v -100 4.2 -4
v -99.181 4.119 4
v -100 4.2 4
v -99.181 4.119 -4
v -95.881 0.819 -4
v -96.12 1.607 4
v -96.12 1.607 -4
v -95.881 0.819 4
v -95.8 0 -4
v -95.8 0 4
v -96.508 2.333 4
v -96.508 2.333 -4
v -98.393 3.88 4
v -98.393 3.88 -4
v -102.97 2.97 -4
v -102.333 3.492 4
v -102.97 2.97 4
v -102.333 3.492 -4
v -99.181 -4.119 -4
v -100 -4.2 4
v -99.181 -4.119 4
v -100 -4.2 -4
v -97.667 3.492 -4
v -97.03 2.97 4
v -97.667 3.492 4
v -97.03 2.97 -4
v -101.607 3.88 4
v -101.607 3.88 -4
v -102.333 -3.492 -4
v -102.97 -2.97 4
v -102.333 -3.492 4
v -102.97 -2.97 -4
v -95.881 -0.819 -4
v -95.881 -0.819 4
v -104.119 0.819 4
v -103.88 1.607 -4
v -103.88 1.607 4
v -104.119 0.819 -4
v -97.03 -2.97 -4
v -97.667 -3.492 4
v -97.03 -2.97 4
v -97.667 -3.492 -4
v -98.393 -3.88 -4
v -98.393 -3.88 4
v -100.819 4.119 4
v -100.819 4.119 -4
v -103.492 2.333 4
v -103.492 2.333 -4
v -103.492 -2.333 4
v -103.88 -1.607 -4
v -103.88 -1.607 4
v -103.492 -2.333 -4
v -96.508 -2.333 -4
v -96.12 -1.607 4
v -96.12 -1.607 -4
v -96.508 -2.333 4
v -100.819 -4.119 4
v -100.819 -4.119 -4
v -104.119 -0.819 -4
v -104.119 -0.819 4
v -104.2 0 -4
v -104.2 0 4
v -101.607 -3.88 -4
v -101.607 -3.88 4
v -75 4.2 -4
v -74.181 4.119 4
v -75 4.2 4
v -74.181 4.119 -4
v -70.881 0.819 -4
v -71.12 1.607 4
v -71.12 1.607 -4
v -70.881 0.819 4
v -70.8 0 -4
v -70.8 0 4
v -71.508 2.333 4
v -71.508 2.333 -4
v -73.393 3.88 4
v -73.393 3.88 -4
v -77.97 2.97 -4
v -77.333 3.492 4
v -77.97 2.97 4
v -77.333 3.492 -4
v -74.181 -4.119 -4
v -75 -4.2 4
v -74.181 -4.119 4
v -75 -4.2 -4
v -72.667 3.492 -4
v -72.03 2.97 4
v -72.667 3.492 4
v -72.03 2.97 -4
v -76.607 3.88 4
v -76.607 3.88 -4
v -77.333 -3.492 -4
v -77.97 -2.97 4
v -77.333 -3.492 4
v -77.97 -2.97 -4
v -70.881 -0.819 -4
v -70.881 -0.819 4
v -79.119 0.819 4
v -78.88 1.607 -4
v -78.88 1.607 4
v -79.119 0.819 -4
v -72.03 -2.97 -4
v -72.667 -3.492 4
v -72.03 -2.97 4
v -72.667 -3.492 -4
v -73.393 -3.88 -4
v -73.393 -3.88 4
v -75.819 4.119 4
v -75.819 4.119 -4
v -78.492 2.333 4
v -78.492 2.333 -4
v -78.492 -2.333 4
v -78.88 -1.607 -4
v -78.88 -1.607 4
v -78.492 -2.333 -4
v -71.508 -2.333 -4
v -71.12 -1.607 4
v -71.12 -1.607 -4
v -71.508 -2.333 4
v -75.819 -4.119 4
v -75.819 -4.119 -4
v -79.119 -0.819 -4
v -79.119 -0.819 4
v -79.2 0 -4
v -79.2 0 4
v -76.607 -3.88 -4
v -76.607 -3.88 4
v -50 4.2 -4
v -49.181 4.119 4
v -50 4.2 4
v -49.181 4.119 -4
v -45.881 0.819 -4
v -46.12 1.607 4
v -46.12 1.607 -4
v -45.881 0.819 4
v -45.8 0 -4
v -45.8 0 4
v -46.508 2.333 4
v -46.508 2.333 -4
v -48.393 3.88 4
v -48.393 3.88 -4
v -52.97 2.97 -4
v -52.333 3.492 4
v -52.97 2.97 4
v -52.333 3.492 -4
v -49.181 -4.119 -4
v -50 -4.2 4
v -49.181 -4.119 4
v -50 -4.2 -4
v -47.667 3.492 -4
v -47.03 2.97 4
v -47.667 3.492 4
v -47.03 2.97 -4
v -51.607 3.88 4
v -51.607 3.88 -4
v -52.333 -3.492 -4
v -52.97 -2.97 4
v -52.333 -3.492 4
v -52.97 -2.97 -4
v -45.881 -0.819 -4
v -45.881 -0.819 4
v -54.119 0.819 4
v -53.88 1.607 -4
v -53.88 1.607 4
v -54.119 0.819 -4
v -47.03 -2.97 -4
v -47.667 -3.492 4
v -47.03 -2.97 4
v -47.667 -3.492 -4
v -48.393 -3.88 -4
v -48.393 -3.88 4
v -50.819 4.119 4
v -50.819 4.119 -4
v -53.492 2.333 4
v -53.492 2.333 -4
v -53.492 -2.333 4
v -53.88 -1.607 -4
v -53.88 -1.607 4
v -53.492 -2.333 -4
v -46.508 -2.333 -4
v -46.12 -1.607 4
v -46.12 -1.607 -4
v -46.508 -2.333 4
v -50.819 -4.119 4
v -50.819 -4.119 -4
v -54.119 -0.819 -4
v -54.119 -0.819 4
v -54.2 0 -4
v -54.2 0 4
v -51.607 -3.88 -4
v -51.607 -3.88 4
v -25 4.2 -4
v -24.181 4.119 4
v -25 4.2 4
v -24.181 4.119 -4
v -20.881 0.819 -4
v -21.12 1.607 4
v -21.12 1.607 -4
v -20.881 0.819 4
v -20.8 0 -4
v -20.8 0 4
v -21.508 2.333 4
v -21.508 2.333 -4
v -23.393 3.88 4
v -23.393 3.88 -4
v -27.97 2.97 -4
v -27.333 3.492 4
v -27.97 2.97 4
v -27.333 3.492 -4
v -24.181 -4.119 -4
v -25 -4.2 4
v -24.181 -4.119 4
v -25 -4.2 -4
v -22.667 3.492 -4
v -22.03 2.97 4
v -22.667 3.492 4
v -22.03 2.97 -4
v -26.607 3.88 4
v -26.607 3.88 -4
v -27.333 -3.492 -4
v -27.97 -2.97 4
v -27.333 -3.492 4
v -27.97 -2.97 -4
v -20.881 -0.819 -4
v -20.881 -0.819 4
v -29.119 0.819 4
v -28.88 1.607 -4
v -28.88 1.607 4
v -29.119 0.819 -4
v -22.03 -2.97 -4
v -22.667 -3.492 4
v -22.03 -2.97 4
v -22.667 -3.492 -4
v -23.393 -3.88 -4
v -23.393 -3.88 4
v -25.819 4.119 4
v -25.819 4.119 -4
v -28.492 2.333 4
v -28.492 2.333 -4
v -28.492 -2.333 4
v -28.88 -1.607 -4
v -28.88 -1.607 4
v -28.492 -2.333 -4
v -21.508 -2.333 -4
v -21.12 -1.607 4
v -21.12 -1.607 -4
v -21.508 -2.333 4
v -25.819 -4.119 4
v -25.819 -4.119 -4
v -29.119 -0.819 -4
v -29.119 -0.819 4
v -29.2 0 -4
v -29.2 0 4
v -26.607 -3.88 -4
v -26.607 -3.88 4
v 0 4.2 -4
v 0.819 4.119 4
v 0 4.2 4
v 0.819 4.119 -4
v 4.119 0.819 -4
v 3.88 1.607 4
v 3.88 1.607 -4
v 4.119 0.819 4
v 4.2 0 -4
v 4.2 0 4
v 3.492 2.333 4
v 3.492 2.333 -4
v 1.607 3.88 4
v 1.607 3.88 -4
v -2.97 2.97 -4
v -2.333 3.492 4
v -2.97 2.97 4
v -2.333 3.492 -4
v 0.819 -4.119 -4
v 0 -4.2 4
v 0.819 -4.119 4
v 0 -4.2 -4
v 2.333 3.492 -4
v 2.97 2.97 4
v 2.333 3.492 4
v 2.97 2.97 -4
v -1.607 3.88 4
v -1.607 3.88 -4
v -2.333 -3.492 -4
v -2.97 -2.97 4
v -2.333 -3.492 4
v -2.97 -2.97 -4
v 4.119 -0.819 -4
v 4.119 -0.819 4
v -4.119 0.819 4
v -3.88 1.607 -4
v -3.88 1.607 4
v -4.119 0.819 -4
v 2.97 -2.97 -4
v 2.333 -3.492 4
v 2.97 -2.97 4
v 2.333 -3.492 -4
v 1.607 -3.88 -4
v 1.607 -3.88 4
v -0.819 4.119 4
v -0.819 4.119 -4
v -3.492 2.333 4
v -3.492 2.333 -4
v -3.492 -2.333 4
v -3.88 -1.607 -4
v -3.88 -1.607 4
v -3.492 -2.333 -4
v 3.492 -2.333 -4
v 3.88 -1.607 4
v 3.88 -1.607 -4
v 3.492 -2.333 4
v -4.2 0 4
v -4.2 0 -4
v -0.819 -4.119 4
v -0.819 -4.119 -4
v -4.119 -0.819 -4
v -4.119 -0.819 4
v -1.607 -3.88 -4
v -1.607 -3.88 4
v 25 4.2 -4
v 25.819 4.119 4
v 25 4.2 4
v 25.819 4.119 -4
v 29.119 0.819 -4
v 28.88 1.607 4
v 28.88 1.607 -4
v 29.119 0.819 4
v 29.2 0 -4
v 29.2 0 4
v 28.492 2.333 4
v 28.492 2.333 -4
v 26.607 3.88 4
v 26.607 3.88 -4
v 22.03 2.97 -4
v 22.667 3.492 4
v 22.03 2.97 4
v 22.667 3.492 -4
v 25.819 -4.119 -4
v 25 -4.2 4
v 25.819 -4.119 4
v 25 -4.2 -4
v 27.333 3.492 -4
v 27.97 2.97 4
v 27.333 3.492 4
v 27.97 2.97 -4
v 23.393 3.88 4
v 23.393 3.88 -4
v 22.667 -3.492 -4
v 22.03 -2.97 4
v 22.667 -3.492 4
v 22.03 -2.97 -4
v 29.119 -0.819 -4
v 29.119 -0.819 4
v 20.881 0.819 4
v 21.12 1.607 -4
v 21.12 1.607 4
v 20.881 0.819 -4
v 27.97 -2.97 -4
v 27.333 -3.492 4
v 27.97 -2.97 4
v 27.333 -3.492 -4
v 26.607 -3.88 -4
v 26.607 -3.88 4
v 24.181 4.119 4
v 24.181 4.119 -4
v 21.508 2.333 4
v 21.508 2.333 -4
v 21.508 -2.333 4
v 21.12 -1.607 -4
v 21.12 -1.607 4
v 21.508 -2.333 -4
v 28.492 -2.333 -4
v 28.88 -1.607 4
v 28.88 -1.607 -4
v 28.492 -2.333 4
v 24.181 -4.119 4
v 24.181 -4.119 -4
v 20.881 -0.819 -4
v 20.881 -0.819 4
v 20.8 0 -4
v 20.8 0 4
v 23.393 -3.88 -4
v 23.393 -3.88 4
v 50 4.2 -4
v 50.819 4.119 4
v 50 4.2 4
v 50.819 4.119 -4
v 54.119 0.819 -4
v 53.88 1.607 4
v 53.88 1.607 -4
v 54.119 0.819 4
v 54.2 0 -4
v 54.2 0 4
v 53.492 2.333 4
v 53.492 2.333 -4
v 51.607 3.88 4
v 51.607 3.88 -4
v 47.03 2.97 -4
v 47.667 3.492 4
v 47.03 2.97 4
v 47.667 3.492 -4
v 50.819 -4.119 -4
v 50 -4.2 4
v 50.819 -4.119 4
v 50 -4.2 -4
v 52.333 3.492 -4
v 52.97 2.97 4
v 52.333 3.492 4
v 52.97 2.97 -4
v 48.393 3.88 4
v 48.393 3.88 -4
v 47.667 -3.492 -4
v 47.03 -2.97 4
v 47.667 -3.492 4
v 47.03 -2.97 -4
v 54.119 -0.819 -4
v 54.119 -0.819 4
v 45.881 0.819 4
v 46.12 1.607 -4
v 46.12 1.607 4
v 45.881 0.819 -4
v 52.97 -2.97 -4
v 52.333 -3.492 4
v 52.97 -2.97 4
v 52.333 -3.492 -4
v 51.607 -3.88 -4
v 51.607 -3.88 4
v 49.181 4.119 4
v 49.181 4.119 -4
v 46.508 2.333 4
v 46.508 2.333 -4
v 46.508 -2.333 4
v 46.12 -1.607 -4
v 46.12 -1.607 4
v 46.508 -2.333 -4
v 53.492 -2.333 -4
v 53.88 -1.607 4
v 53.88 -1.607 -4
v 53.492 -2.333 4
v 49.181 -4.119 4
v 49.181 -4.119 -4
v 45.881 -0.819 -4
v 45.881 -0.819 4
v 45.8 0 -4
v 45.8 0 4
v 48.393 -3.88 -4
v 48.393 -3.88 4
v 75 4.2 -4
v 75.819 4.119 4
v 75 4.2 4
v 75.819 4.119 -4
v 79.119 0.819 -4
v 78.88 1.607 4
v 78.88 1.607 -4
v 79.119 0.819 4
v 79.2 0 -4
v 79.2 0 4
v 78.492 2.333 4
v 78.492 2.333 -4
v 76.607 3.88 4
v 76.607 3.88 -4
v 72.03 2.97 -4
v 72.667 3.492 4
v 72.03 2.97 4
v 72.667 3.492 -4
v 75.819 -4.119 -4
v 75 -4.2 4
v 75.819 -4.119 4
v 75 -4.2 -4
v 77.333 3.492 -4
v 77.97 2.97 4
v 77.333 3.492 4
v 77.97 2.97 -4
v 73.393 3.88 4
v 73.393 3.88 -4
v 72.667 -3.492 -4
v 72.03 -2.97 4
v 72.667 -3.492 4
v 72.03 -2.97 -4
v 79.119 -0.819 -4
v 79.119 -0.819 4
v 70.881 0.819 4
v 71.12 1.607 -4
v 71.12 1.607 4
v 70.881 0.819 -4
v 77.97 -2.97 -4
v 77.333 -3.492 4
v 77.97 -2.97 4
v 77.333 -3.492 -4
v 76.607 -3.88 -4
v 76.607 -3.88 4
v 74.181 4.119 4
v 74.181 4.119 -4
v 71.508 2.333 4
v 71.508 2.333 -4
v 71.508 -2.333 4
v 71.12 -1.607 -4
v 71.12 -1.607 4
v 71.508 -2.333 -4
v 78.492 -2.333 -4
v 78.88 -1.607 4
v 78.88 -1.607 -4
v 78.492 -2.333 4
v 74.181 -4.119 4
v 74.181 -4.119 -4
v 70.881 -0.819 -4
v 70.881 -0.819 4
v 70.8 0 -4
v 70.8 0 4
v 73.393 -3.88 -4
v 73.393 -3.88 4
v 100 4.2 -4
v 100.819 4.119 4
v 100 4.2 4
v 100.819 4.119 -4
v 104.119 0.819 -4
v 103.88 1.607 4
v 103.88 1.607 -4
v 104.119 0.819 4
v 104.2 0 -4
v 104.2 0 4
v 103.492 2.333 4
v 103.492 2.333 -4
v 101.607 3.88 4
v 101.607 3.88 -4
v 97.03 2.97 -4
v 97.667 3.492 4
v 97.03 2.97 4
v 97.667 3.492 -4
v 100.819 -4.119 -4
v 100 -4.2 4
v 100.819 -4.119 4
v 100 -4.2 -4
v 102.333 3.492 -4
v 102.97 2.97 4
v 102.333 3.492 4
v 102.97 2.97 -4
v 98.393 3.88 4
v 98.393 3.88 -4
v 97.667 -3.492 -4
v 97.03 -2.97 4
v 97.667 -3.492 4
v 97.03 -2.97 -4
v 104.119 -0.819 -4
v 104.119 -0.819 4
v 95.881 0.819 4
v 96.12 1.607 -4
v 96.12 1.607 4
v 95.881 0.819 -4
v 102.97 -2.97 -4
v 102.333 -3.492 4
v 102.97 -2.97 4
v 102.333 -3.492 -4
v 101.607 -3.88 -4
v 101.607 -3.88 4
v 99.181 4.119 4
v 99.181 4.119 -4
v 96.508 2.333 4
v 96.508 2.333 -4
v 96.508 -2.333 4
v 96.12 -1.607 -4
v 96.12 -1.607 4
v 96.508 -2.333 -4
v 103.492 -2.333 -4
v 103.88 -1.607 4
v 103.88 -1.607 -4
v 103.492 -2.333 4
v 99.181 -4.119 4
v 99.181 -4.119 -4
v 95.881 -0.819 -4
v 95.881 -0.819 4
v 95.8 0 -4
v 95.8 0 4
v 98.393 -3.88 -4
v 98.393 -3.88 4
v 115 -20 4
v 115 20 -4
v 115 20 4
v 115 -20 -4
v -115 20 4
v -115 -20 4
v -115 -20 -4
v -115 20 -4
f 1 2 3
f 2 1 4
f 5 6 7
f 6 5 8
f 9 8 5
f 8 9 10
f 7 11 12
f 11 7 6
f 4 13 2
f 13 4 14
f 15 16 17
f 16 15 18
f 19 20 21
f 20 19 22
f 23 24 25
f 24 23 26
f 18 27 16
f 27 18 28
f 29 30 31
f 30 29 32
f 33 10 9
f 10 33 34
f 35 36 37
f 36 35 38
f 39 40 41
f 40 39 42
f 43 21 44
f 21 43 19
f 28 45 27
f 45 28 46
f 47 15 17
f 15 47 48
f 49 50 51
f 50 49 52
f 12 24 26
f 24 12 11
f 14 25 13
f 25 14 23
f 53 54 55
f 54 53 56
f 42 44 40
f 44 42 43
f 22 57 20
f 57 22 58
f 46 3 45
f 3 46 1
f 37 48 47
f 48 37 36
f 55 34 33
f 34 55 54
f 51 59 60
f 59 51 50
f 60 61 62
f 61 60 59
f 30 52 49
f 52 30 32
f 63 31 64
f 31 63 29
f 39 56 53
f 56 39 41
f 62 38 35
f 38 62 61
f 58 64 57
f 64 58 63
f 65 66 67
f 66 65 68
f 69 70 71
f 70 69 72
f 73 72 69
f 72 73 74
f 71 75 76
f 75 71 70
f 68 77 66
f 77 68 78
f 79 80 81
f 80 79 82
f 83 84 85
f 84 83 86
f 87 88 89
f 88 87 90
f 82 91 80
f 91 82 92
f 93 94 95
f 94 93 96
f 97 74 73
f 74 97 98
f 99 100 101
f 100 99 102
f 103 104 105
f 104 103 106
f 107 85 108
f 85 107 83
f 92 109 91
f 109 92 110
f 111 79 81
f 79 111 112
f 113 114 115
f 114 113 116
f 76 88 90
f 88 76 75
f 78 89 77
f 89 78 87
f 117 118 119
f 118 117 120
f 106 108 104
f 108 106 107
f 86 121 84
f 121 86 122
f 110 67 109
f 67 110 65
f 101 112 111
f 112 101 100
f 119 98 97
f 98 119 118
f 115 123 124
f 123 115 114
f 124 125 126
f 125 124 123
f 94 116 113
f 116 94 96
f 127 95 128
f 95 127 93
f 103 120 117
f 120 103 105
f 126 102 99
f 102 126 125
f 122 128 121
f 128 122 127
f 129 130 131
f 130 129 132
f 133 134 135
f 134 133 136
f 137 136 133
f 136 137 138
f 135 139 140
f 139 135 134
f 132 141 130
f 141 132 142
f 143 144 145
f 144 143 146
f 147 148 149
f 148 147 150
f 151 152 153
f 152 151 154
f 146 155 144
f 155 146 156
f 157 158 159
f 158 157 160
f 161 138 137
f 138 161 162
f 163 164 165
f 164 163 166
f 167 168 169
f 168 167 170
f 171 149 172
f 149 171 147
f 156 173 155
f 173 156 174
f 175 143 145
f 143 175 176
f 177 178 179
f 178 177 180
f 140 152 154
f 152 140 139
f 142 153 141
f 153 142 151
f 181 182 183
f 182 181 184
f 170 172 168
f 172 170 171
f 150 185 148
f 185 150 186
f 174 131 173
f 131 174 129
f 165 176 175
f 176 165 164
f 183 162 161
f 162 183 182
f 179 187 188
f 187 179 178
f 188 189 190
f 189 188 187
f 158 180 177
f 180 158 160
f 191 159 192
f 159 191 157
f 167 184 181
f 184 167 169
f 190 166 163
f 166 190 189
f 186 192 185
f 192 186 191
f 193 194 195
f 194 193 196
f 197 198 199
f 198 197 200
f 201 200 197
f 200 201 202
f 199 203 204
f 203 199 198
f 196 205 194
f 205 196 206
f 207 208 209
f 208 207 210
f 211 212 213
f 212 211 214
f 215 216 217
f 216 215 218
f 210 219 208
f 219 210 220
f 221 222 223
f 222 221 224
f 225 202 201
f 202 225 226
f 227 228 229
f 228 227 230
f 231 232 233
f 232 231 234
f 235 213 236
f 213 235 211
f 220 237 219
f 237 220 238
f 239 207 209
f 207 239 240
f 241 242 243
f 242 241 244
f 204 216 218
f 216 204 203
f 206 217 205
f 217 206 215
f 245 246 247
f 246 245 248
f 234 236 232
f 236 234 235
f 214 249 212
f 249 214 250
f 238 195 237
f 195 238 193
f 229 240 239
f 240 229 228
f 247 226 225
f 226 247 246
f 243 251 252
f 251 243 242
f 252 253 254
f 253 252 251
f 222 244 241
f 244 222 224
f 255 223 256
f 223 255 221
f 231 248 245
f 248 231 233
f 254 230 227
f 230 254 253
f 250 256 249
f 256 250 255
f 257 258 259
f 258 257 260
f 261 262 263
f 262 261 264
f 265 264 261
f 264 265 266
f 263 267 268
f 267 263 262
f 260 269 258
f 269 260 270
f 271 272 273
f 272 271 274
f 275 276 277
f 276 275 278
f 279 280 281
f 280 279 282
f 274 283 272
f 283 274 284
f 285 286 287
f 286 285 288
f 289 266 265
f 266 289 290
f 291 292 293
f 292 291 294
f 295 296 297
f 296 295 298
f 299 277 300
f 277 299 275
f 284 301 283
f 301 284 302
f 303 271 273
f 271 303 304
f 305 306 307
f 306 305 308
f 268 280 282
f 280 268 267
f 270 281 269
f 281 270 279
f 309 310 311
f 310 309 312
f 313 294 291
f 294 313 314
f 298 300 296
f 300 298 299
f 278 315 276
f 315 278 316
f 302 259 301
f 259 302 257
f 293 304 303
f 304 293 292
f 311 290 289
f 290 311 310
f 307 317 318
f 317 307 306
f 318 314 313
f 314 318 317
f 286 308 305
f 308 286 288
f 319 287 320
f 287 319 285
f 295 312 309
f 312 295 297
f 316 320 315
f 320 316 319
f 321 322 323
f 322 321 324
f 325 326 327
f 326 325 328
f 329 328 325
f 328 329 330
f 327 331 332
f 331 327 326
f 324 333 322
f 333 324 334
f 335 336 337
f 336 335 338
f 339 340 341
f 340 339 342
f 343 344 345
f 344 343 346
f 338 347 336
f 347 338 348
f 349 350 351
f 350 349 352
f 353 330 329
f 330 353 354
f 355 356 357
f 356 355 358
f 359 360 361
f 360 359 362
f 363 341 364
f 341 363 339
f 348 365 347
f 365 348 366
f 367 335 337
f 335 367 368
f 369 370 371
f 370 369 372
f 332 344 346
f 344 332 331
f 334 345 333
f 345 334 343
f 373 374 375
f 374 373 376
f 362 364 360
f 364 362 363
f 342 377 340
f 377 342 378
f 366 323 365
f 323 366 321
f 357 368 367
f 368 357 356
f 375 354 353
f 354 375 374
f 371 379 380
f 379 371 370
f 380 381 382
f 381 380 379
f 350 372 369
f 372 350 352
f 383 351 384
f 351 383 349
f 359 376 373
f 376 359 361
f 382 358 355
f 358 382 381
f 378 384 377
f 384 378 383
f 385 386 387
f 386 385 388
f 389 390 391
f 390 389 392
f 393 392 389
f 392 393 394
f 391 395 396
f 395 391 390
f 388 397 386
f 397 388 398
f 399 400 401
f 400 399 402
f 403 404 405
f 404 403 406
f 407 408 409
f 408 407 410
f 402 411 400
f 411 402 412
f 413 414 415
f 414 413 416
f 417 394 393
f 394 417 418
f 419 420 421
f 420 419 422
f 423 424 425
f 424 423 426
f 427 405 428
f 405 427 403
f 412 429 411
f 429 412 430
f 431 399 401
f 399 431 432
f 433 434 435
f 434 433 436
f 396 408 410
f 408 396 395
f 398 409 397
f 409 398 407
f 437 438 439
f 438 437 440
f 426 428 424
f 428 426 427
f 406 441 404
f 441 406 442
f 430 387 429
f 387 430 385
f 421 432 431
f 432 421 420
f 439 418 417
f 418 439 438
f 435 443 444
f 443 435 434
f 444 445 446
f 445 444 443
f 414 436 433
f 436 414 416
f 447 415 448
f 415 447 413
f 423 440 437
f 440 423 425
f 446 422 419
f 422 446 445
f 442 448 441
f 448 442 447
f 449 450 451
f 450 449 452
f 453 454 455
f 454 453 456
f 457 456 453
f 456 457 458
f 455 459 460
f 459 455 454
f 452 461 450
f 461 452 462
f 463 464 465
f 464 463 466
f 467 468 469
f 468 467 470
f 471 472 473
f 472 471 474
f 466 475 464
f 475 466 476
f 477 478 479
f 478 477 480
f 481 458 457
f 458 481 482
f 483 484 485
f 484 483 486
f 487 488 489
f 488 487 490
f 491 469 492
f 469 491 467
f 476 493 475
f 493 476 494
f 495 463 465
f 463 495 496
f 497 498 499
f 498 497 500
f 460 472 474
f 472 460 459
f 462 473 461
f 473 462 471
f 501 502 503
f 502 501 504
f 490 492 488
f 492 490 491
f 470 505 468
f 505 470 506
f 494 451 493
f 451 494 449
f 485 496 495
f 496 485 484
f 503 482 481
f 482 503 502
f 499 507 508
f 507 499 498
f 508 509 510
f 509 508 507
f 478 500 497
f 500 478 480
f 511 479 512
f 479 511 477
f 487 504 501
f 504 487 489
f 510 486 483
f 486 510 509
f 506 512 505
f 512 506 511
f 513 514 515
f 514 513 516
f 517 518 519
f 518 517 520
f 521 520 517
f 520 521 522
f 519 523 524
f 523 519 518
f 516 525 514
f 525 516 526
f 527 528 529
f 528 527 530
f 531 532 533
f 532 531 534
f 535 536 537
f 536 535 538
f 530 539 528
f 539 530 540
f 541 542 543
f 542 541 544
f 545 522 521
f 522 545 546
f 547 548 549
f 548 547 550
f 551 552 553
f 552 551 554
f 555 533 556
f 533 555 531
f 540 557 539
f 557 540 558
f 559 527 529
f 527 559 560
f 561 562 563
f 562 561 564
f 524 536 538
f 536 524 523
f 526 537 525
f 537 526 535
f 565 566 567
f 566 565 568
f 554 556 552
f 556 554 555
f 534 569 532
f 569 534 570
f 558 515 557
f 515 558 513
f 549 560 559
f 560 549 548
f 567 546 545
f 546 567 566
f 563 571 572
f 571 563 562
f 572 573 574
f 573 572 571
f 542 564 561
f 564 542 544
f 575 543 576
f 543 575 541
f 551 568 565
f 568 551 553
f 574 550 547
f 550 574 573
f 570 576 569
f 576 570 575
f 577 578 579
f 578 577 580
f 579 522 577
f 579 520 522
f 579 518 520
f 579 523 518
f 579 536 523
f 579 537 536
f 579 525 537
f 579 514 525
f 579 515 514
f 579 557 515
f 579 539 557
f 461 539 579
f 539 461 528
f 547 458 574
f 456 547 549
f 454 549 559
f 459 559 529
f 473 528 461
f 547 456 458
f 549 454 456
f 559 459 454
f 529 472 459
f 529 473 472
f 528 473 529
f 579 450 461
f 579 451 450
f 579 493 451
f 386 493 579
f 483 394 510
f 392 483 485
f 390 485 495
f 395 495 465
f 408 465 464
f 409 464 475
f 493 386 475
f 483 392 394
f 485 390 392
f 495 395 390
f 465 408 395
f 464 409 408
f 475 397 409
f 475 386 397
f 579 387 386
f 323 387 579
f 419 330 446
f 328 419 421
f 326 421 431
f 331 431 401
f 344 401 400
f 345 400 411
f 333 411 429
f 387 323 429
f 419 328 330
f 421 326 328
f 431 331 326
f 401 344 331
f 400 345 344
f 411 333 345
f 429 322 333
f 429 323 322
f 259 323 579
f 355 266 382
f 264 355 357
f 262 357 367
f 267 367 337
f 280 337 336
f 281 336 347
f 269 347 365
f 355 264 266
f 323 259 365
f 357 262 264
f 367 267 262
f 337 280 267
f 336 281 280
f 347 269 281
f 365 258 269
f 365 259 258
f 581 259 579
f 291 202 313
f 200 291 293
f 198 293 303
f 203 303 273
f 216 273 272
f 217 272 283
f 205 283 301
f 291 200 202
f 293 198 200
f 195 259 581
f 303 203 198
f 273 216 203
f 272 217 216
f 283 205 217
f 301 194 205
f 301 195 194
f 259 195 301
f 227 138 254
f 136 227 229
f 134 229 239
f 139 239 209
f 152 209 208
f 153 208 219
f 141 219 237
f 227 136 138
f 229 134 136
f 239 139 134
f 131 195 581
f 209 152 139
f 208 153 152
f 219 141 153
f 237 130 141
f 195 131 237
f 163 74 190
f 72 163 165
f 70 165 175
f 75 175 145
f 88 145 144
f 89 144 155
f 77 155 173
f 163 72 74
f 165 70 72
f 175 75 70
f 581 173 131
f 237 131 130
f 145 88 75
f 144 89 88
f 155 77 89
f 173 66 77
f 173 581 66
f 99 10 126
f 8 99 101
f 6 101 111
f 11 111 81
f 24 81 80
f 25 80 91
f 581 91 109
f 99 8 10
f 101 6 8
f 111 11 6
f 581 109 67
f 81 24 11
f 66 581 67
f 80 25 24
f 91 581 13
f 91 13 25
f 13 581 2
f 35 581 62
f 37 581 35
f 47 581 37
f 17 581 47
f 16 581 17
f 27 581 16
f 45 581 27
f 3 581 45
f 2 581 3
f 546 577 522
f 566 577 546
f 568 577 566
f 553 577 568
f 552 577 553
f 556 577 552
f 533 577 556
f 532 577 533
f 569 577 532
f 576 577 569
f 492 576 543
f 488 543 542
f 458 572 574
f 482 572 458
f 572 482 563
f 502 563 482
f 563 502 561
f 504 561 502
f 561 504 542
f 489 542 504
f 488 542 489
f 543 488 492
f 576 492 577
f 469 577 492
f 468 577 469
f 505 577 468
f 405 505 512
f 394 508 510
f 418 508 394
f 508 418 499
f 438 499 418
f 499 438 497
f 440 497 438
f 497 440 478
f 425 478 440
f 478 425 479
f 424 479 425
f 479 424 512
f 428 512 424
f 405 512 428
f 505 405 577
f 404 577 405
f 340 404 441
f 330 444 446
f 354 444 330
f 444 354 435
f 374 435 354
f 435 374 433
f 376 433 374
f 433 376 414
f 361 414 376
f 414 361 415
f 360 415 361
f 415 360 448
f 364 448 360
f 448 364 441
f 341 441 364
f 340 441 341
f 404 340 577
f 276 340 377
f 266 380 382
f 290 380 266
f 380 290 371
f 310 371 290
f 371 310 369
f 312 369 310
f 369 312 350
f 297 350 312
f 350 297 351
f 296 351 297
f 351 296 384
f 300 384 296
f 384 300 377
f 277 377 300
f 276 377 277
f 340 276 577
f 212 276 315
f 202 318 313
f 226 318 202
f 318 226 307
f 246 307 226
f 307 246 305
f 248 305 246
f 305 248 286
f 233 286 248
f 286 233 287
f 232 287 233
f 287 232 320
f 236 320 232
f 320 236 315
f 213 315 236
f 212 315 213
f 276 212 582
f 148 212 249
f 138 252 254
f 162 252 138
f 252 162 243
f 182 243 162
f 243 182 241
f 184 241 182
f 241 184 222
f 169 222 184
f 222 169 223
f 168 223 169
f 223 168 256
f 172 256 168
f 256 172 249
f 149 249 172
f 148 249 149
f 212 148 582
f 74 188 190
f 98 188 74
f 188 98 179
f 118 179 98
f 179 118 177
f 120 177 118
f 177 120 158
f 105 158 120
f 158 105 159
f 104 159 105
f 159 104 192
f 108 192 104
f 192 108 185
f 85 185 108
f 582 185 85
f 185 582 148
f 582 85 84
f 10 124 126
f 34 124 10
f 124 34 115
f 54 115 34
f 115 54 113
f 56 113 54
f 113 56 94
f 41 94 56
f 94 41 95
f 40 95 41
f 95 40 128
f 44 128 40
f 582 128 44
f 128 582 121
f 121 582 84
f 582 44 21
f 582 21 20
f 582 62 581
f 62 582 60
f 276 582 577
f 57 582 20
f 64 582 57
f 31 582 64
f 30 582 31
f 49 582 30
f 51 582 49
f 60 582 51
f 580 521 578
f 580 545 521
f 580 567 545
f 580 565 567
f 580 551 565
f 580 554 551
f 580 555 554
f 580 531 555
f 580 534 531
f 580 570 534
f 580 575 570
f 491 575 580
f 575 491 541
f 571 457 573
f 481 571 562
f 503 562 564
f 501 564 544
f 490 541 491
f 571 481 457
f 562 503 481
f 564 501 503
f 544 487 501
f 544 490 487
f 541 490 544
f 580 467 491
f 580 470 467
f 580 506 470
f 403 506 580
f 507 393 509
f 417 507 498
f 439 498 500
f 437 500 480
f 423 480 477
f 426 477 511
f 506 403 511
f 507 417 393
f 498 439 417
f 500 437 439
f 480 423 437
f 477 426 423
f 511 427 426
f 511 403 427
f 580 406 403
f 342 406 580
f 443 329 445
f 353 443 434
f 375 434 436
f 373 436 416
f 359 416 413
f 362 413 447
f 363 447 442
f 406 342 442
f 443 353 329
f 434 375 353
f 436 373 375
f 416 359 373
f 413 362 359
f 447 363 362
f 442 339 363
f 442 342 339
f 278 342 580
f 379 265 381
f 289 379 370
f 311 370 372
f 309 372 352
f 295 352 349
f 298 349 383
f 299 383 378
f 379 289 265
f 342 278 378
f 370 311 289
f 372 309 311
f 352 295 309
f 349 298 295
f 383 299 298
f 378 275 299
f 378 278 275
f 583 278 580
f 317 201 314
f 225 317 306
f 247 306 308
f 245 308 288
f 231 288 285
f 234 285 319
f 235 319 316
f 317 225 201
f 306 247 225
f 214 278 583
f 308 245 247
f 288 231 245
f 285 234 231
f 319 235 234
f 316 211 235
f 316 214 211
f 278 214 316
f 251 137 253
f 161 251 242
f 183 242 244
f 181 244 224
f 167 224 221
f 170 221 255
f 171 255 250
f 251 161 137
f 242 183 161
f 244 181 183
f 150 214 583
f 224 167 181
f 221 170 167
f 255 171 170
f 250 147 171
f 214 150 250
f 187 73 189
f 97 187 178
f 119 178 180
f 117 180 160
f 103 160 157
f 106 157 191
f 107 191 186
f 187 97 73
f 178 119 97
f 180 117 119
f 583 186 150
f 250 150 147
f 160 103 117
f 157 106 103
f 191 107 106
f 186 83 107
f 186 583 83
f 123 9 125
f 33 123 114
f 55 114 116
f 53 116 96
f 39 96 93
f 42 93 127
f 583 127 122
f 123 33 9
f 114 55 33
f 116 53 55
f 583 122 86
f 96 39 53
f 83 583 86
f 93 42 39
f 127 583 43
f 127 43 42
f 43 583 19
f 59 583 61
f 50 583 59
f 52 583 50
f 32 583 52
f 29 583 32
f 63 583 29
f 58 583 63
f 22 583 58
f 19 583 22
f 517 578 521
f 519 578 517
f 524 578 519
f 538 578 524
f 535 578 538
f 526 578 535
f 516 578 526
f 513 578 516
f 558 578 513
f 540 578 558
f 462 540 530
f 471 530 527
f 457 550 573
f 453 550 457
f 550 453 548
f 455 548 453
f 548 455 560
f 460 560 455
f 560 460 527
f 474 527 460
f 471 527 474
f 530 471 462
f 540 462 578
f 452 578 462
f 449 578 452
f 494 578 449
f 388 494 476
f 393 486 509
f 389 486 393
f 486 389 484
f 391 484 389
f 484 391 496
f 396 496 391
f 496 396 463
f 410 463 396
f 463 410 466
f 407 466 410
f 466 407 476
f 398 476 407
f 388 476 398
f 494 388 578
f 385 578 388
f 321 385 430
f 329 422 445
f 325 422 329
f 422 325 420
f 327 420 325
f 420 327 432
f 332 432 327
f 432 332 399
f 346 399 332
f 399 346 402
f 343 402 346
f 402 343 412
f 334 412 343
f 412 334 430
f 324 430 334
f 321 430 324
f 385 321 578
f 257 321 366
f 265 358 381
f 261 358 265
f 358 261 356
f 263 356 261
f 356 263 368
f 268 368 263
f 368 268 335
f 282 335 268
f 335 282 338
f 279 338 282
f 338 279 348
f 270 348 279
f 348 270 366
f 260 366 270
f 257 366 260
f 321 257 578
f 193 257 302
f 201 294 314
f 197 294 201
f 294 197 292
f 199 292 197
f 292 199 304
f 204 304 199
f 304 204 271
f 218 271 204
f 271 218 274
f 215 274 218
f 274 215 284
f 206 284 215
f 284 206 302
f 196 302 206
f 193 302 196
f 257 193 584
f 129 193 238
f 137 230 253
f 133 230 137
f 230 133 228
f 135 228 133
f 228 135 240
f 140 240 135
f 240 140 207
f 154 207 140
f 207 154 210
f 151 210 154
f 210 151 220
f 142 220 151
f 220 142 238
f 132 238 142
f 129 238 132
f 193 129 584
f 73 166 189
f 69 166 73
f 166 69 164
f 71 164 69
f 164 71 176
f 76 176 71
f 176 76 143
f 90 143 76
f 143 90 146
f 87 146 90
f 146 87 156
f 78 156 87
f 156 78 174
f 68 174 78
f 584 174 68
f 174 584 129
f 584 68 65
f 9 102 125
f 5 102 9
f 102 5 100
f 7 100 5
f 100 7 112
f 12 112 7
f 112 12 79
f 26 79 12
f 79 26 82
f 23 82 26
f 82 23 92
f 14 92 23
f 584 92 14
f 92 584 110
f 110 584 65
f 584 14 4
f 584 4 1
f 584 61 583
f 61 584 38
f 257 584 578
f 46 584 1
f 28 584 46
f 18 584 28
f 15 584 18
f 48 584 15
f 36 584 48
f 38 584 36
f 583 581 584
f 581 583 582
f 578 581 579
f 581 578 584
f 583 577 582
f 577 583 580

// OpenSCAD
$fn = 32;

// ----------------------------------------------------------------------
// Hole bar, 9 x Ø8.4
// skip layout, 15 mm edge offset
// ----------------------------------------------------------------------

// --- parameters (mm) ---
bar_w = 40;         // bar width (Y)
bar_t = 8;          // bar thickness (Z)
holes = 9;          // holes per row
hole_d = 8.4;       // hole diameter
edge = 15;          // offset from the bar end to the first hole
grid_pitch = 12.5;  // grid the bar was laid out on

// --- derived feature positions (mm) ---
pitch = grid_pitch * 2;       // = 25   holes sit every other grid slot
span = (holes - 1) * pitch;   // = 200   distance between the end holes
bar_l = span + 2 * edge;      // = 230   overall bar length
start_x = -bar_l / 2 + edge;  // = -100   X of the first hole
feature_centers = [
  [start_x + 0 * pitch, 0],
  [start_x + 1 * pitch, 0],
  [start_x + 2 * pitch, 0],
  [start_x + 3 * pitch, 0],
  [start_x + 4 * pitch, 0],
  [start_x + 5 * pitch, 0],
  [start_x + 6 * pitch, 0],
  [start_x + 7 * pitch, 0],
  [start_x + 8 * pitch, 0]
];   // hole centres of the first row

// bar with one row of holes, drilled from feature_centers
difference() {
  translate([-bar_l / 2, -bar_w / 2, -bar_t / 2]) cube([bar_l, bar_w, bar_t]);
  for (centre = feature_centers)
    translate([centre[0], centre[1], 0])
      cylinder(d = hole_d, h = bar_t + 2, center = true);
}
